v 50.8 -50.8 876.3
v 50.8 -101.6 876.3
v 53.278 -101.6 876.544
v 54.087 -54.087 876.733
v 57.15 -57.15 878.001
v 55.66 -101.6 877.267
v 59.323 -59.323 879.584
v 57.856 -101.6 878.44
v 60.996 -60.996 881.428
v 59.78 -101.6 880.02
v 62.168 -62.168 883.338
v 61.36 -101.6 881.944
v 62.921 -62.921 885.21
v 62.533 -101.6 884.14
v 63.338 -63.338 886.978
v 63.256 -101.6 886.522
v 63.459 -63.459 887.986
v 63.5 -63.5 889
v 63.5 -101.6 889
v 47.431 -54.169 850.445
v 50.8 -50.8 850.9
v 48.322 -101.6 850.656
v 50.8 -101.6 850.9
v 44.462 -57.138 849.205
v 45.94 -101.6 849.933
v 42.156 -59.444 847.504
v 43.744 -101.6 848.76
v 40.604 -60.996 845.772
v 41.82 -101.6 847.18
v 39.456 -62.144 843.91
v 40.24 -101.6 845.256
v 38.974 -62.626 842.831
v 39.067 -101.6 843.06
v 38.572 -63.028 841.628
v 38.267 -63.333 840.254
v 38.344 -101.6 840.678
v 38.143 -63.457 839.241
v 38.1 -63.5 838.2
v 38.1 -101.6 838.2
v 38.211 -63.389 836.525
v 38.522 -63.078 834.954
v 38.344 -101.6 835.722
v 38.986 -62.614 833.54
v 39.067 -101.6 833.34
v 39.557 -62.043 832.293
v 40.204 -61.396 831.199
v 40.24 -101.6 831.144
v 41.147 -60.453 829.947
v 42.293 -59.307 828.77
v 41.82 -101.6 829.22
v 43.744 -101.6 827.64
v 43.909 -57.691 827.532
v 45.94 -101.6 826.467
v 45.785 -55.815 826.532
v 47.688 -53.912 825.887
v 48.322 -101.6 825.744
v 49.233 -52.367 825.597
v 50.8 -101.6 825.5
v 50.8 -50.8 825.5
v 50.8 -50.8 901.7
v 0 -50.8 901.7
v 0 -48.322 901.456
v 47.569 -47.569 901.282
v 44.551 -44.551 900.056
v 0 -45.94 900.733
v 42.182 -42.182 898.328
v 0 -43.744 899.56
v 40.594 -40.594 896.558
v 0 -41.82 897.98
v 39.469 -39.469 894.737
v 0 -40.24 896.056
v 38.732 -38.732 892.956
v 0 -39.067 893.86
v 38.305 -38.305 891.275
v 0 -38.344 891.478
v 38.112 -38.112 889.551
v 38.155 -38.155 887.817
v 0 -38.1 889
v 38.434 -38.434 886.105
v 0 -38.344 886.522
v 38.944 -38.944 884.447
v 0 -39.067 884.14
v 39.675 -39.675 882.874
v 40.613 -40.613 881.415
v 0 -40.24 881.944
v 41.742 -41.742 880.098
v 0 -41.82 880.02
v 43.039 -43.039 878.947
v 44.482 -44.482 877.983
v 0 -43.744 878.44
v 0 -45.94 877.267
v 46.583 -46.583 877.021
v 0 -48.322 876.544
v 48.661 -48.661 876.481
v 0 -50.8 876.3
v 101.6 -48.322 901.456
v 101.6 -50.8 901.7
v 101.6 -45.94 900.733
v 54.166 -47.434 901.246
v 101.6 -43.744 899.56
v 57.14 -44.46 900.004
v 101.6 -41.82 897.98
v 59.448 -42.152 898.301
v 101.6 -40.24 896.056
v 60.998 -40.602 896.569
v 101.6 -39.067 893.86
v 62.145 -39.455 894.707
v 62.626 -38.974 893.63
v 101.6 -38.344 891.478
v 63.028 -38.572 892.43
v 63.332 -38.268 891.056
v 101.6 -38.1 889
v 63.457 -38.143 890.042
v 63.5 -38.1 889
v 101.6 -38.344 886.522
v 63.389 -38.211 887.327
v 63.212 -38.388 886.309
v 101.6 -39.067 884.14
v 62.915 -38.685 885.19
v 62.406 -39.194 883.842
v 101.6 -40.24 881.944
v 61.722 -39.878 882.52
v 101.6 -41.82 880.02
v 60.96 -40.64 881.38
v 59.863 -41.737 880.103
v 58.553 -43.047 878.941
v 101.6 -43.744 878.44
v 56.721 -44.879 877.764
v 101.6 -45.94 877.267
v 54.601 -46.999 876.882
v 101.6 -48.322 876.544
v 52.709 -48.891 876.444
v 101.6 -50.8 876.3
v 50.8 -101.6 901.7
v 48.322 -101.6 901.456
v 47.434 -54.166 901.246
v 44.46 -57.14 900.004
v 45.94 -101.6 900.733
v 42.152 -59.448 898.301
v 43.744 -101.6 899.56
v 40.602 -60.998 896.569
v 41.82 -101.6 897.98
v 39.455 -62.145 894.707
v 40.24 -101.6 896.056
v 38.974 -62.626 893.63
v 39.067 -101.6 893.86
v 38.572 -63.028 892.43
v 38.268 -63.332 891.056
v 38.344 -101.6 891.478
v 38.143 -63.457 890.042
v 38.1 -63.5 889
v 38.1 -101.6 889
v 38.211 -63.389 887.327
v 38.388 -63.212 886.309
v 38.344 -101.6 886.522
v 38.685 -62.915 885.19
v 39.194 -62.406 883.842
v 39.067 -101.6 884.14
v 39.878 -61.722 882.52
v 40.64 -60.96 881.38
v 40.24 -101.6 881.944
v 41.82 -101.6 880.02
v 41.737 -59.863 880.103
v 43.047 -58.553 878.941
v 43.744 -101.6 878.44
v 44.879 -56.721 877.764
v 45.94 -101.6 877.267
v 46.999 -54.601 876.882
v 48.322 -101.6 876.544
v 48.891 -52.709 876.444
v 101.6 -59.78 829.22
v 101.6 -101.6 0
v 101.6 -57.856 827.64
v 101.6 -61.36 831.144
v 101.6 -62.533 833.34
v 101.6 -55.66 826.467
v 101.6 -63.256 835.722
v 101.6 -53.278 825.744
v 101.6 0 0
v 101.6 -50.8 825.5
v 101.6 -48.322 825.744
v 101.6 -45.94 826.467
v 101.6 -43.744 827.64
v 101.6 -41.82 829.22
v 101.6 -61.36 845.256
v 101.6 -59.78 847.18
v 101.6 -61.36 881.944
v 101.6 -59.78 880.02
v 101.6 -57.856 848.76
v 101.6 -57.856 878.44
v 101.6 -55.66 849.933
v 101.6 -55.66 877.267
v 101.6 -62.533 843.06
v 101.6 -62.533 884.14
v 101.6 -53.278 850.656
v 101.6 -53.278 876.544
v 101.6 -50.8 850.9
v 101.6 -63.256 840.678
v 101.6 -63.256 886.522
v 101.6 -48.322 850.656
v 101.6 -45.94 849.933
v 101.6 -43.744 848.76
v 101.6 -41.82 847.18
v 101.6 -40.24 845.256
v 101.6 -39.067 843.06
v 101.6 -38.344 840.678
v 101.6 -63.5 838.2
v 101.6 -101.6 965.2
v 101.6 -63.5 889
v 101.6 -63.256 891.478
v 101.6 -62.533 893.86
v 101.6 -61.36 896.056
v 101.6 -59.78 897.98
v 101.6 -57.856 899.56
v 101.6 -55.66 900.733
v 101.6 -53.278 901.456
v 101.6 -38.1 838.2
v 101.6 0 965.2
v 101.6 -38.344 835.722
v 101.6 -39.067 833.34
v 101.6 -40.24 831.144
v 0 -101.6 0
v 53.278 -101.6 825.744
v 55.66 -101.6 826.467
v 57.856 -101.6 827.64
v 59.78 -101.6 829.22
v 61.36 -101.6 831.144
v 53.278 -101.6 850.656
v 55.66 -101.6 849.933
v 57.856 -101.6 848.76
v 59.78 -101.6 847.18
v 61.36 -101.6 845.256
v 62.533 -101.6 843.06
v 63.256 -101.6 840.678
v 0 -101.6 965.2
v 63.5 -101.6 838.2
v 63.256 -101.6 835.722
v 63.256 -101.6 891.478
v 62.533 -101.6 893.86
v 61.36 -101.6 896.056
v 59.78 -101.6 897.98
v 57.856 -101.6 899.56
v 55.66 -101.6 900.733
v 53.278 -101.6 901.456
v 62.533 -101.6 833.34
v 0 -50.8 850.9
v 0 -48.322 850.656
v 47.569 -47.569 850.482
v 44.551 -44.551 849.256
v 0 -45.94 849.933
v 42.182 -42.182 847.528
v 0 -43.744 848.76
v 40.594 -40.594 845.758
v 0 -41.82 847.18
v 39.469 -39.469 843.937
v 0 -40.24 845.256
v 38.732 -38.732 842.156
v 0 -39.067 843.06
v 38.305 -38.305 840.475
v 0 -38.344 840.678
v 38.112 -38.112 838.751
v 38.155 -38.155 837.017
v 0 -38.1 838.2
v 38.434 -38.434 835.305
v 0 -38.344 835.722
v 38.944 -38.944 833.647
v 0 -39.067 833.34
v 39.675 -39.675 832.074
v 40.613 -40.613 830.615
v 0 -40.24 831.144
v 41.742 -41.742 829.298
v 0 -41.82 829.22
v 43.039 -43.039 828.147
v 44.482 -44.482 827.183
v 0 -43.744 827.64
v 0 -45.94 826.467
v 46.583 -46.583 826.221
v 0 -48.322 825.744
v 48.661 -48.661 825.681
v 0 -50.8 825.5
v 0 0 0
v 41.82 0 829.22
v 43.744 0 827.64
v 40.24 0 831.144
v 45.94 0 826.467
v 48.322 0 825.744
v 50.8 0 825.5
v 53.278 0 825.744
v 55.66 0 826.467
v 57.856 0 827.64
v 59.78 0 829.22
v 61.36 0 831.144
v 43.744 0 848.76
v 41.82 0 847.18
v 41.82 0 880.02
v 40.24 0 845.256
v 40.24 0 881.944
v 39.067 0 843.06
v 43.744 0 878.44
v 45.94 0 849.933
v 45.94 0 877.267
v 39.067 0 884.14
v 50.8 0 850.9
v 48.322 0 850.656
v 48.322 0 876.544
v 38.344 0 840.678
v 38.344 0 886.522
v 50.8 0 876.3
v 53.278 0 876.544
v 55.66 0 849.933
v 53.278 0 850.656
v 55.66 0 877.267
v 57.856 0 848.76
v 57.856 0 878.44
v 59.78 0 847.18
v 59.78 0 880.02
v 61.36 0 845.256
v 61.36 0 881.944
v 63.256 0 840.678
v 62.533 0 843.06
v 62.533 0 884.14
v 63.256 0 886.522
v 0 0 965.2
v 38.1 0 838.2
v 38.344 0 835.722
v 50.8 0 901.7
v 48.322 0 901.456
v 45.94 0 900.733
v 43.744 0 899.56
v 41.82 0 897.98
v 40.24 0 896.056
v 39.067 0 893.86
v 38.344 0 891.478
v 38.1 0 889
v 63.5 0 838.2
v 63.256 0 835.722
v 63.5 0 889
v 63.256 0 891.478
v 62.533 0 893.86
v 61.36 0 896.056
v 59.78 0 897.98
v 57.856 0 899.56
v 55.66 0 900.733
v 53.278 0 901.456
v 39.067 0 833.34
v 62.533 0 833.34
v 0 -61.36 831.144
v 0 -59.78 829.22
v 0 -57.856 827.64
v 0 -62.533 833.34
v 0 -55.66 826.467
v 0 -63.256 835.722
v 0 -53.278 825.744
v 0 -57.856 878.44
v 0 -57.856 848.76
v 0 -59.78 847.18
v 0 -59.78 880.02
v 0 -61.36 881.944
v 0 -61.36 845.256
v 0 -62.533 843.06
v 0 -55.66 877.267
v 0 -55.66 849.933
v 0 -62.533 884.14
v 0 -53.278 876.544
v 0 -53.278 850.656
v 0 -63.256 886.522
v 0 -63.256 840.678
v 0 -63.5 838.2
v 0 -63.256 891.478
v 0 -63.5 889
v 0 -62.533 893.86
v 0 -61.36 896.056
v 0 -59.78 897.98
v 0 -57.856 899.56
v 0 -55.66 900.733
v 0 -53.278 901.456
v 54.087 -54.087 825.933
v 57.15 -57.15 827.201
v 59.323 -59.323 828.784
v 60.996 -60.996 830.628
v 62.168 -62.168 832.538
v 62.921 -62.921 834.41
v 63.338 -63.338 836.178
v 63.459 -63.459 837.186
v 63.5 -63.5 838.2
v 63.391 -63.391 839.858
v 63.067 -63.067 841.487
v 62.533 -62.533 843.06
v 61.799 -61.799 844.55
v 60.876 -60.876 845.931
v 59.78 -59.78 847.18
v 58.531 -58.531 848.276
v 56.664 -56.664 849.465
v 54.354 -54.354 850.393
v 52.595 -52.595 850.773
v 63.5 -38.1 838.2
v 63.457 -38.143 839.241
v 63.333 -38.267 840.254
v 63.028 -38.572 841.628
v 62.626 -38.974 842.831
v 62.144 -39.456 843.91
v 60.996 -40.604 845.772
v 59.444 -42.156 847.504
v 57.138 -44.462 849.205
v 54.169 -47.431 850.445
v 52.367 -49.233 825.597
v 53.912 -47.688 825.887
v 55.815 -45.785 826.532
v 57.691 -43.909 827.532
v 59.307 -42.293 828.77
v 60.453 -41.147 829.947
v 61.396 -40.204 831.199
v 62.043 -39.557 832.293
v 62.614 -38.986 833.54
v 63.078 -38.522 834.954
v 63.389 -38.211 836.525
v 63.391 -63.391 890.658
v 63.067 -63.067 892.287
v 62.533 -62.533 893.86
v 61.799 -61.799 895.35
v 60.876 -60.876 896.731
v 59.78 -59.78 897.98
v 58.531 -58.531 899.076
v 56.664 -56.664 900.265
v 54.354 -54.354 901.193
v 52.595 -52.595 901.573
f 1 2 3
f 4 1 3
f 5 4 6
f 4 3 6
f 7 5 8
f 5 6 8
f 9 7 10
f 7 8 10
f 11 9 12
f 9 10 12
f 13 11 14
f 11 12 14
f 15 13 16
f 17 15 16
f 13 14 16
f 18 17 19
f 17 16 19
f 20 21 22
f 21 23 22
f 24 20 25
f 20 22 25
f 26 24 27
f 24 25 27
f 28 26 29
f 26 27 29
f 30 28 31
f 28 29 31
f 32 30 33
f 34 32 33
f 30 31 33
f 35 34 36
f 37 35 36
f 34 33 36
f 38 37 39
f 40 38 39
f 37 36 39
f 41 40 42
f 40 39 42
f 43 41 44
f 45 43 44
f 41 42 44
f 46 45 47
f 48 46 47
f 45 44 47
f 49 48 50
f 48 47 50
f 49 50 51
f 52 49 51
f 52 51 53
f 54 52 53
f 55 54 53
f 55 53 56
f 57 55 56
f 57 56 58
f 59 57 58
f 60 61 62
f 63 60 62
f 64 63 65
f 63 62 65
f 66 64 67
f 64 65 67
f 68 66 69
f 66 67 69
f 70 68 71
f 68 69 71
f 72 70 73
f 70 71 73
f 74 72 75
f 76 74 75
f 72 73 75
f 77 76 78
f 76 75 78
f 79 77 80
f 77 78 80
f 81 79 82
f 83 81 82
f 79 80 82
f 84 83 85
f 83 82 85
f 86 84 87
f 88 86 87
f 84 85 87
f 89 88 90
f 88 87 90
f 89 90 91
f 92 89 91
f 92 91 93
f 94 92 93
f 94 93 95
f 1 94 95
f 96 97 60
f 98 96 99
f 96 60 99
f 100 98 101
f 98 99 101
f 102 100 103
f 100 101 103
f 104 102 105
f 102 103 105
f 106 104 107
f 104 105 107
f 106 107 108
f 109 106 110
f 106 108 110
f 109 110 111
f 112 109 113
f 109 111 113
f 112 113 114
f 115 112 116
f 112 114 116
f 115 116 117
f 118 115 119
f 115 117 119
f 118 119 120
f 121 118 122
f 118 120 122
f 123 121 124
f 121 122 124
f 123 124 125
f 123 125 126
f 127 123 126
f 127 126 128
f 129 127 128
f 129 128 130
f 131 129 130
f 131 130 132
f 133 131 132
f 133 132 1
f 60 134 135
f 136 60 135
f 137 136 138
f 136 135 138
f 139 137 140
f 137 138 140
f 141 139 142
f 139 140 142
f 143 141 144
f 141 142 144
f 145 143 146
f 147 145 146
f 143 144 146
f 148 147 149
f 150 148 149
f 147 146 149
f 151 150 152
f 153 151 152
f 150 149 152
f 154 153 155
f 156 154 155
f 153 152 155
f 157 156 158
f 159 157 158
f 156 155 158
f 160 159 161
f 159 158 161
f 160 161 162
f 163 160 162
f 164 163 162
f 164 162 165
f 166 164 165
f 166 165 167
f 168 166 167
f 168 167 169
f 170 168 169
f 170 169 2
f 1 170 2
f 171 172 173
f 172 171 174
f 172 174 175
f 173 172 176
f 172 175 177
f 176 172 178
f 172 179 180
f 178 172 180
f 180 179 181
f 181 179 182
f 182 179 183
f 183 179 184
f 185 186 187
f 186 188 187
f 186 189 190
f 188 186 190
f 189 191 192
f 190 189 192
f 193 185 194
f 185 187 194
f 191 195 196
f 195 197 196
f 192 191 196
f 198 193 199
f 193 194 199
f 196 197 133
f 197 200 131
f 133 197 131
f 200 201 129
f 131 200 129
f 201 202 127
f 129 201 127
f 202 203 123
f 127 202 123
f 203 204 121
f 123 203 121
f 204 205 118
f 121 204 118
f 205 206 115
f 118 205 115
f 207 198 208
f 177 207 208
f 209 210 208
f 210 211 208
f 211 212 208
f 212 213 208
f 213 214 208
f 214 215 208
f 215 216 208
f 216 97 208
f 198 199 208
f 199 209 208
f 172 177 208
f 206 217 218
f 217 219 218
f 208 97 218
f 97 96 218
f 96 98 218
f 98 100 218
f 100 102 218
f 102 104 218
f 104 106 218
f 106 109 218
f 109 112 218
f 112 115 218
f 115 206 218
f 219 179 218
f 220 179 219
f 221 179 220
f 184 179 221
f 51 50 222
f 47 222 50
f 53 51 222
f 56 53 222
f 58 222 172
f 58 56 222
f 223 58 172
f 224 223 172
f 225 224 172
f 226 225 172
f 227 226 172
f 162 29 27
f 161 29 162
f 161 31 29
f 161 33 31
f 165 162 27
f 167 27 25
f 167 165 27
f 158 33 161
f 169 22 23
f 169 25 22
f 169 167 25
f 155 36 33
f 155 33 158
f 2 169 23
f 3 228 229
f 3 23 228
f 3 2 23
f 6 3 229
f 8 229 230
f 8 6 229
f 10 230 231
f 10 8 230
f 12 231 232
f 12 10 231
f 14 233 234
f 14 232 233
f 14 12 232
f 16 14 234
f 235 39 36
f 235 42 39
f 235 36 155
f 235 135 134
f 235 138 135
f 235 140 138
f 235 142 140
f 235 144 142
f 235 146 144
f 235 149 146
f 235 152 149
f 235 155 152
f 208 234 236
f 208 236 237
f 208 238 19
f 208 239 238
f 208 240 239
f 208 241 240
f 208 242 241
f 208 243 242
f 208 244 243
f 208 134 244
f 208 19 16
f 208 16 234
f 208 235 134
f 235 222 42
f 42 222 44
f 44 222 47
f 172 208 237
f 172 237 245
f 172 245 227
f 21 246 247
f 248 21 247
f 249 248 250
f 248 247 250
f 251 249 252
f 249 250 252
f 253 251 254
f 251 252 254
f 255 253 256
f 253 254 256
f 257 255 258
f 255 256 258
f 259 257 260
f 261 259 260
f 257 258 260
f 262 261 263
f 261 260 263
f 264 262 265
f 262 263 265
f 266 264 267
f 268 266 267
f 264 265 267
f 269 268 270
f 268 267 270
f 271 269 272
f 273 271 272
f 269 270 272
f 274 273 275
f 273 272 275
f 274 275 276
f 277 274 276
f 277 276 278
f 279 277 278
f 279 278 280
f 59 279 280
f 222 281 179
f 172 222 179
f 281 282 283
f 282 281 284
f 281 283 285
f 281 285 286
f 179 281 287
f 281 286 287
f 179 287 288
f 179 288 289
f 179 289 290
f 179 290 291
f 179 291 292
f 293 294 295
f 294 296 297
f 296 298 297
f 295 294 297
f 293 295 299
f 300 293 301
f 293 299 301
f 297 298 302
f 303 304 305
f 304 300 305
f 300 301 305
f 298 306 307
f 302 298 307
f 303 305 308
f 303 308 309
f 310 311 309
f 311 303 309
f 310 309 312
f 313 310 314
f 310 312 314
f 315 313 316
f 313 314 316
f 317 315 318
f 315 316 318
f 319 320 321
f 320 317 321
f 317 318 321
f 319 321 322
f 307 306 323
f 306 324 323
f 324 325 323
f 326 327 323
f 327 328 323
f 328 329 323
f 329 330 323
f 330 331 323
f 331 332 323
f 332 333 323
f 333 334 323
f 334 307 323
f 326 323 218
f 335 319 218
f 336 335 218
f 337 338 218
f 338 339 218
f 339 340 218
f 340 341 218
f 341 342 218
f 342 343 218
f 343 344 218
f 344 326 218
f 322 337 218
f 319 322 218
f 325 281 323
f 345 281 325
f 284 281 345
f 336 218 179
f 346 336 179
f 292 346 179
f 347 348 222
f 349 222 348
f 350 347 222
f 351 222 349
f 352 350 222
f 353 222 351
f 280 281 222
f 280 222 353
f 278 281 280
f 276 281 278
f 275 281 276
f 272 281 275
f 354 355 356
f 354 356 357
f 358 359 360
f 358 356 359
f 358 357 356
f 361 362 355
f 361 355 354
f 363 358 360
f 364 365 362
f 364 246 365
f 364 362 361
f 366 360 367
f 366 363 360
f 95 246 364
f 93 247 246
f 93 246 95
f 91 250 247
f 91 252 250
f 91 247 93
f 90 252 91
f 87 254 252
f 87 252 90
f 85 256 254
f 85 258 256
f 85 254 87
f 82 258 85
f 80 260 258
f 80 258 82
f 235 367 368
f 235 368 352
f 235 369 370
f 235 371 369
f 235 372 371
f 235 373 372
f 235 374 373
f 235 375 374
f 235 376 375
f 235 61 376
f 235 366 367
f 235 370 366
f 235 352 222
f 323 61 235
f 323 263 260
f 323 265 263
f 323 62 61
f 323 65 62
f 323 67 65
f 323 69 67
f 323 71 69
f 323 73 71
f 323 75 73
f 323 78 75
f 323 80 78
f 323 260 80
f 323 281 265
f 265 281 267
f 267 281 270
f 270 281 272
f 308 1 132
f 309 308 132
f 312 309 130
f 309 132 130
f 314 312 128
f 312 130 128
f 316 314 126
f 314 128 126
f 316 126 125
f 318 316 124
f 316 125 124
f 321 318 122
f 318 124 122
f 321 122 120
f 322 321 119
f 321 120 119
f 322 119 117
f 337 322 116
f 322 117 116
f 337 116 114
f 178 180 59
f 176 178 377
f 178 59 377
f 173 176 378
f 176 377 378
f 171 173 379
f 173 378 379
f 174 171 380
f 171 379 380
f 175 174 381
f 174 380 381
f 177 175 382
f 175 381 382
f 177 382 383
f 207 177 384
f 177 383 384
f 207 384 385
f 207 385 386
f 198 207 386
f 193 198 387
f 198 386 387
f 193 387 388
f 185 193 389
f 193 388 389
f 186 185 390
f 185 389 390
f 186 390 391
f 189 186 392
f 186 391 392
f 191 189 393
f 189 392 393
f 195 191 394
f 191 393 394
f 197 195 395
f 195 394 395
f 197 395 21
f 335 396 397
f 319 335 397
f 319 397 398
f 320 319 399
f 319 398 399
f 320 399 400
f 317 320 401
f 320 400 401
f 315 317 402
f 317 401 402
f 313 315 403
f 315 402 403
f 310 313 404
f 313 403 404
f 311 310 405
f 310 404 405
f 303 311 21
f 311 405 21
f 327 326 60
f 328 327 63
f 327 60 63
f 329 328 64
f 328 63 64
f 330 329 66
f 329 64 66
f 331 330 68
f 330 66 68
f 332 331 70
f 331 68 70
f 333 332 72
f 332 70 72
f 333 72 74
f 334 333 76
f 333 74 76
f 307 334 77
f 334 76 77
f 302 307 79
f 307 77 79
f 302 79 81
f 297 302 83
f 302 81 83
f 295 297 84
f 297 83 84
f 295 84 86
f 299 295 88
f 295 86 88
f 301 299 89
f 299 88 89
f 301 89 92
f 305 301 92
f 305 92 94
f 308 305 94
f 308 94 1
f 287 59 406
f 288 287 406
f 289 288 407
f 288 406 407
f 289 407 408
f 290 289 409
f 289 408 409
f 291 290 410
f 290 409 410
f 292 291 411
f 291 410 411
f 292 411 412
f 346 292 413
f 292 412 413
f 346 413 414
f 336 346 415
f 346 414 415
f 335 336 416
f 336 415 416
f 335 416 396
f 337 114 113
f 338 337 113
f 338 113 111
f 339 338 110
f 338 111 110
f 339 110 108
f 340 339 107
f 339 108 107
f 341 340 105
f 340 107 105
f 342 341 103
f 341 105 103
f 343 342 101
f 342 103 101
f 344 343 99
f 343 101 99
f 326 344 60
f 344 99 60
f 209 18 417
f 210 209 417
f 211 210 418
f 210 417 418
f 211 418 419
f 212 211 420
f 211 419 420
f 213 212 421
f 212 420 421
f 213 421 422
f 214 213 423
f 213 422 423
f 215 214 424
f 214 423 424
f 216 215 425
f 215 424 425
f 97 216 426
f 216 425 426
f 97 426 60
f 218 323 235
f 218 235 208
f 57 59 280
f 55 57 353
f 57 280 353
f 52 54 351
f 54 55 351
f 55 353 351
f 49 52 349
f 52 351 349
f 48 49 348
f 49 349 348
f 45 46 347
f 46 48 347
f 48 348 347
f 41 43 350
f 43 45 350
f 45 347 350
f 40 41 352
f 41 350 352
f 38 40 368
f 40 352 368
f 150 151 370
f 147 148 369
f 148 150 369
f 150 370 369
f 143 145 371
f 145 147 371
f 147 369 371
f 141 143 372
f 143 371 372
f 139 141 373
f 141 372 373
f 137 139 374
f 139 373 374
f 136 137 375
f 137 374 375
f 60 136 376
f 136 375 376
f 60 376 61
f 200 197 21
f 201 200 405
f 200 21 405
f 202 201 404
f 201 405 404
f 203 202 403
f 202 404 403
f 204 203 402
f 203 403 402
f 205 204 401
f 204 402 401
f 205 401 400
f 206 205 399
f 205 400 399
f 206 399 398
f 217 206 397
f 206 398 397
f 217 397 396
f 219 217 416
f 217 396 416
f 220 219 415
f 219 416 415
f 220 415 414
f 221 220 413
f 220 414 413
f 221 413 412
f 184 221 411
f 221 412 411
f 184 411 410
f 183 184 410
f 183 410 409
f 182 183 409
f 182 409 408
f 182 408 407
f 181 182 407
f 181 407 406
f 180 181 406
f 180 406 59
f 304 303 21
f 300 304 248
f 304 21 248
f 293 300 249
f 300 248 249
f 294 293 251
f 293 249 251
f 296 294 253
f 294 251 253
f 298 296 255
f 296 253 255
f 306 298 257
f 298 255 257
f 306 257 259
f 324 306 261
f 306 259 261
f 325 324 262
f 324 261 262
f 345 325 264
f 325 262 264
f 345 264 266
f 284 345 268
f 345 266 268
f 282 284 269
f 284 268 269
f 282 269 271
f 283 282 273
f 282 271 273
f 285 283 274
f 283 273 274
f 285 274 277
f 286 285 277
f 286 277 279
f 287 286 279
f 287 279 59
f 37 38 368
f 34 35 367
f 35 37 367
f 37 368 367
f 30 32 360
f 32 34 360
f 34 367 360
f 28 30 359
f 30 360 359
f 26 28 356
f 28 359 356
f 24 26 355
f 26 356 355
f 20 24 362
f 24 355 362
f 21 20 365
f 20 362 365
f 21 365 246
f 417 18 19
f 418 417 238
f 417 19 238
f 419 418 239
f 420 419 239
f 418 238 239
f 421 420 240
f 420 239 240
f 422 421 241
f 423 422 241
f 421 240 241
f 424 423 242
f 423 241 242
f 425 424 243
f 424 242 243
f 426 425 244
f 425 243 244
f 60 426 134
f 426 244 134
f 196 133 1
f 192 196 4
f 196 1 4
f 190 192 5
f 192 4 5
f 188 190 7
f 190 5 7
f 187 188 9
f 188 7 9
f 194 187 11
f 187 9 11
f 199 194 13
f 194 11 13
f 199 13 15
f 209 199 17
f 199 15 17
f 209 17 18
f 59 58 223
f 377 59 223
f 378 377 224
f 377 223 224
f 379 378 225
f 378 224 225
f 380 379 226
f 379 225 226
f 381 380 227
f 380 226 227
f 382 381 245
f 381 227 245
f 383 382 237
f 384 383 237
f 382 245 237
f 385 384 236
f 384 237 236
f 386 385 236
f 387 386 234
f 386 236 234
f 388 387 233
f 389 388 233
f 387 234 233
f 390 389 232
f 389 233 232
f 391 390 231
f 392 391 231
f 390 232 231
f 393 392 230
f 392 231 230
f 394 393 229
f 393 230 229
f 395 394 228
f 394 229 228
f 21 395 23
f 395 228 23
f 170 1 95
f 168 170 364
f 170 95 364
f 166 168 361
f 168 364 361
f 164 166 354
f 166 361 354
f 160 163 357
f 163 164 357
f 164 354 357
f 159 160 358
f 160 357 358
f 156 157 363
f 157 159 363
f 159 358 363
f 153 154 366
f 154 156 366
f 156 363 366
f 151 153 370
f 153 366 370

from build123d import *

# Parameters (mm, degrees)
F0_W     = 101.6
F0_H     = 965.2
F1_DEPTH = 101.6
F3_DEPTH = 101.601
F5_DEPTH = 101.601


with BuildPart() as f1:
    # F0 (on Front) → F1 (new body)
    with BuildSketch(Plane.XZ):
        with Locations((50.8, 482.6)):
            Rectangle(F0_W, F0_H)
    extrude(amount=F1_DEPTH)

    # F2 (on face) → F3 (cut, through all)
    with BuildSketch(Plane.XZ.offset(101.6)):
        with BuildLine():
            ThreePointArc((63.5, 889), (59.7802561211, 897.9802561211), (50.8, 901.7))
            Line((50.8, 901.7), (50.8, 876.3))
            ThreePointArc((50.8, 876.3), (59.7802561211, 880.0197438789), (63.5, 889))
        make_face()
        with BuildLine():
            ThreePointArc((63.5, 838.2), (59.7802561211, 847.1802561211), (50.8, 850.9))
            Line((50.8, 850.9), (50.8, 825.5))
            ThreePointArc((50.8, 825.5), (59.7802561211, 829.2197438789), (63.5, 838.2))
        make_face()
        with BuildLine():
            Line((50.8, 825.5), (50.8, 850.9))
            ThreePointArc((50.8, 850.9), (38.1, 838.2), (50.8, 825.5))
        make_face()
        with BuildLine():
            Line((50.8, 876.3), (50.8, 901.7))
            ThreePointArc((50.8, 901.7), (38.1, 889), (50.8, 876.3))
        make_face()
    extrude(amount=-F3_DEPTH, mode=Mode.SUBTRACT)

    # F4 (on face) → F5 (cut, through all)
    with BuildSketch(Plane(origin=(0, 0, 0), x_dir=(0, -1, 0), z_dir=(-1, 0, 0))):
        with BuildLine():
            ThreePointArc((63.5, 889), (59.7802561211, 897.9802561211), (50.8, 901.7))
            Line((50.8, 901.7), (50.8, 876.3))
            ThreePointArc((50.8, 876.3), (59.7802561211, 880.0197438789), (63.5, 889))
        make_face()
        with BuildLine():
            ThreePointArc((63.5, 838.2), (59.7802561211, 847.1802561211), (50.8, 850.9))
            Line((50.8, 850.9), (50.8, 825.5))
            ThreePointArc((50.8, 825.5), (59.7802561211, 829.2197438789), (63.5, 838.2))
        make_face()
        with BuildLine():
            Line((50.8, 825.5), (50.8, 850.9))
            ThreePointArc((50.8, 850.9), (38.1, 838.2), (50.8, 825.5))
        make_face()
        with BuildLine():
            Line((50.8, 876.3), (50.8, 901.7))
            ThreePointArc((50.8, 901.7), (38.1, 889), (50.8, 876.3))
        make_face()
    extrude(amount=-F5_DEPTH, mode=Mode.SUBTRACT)


solid = f1.part
